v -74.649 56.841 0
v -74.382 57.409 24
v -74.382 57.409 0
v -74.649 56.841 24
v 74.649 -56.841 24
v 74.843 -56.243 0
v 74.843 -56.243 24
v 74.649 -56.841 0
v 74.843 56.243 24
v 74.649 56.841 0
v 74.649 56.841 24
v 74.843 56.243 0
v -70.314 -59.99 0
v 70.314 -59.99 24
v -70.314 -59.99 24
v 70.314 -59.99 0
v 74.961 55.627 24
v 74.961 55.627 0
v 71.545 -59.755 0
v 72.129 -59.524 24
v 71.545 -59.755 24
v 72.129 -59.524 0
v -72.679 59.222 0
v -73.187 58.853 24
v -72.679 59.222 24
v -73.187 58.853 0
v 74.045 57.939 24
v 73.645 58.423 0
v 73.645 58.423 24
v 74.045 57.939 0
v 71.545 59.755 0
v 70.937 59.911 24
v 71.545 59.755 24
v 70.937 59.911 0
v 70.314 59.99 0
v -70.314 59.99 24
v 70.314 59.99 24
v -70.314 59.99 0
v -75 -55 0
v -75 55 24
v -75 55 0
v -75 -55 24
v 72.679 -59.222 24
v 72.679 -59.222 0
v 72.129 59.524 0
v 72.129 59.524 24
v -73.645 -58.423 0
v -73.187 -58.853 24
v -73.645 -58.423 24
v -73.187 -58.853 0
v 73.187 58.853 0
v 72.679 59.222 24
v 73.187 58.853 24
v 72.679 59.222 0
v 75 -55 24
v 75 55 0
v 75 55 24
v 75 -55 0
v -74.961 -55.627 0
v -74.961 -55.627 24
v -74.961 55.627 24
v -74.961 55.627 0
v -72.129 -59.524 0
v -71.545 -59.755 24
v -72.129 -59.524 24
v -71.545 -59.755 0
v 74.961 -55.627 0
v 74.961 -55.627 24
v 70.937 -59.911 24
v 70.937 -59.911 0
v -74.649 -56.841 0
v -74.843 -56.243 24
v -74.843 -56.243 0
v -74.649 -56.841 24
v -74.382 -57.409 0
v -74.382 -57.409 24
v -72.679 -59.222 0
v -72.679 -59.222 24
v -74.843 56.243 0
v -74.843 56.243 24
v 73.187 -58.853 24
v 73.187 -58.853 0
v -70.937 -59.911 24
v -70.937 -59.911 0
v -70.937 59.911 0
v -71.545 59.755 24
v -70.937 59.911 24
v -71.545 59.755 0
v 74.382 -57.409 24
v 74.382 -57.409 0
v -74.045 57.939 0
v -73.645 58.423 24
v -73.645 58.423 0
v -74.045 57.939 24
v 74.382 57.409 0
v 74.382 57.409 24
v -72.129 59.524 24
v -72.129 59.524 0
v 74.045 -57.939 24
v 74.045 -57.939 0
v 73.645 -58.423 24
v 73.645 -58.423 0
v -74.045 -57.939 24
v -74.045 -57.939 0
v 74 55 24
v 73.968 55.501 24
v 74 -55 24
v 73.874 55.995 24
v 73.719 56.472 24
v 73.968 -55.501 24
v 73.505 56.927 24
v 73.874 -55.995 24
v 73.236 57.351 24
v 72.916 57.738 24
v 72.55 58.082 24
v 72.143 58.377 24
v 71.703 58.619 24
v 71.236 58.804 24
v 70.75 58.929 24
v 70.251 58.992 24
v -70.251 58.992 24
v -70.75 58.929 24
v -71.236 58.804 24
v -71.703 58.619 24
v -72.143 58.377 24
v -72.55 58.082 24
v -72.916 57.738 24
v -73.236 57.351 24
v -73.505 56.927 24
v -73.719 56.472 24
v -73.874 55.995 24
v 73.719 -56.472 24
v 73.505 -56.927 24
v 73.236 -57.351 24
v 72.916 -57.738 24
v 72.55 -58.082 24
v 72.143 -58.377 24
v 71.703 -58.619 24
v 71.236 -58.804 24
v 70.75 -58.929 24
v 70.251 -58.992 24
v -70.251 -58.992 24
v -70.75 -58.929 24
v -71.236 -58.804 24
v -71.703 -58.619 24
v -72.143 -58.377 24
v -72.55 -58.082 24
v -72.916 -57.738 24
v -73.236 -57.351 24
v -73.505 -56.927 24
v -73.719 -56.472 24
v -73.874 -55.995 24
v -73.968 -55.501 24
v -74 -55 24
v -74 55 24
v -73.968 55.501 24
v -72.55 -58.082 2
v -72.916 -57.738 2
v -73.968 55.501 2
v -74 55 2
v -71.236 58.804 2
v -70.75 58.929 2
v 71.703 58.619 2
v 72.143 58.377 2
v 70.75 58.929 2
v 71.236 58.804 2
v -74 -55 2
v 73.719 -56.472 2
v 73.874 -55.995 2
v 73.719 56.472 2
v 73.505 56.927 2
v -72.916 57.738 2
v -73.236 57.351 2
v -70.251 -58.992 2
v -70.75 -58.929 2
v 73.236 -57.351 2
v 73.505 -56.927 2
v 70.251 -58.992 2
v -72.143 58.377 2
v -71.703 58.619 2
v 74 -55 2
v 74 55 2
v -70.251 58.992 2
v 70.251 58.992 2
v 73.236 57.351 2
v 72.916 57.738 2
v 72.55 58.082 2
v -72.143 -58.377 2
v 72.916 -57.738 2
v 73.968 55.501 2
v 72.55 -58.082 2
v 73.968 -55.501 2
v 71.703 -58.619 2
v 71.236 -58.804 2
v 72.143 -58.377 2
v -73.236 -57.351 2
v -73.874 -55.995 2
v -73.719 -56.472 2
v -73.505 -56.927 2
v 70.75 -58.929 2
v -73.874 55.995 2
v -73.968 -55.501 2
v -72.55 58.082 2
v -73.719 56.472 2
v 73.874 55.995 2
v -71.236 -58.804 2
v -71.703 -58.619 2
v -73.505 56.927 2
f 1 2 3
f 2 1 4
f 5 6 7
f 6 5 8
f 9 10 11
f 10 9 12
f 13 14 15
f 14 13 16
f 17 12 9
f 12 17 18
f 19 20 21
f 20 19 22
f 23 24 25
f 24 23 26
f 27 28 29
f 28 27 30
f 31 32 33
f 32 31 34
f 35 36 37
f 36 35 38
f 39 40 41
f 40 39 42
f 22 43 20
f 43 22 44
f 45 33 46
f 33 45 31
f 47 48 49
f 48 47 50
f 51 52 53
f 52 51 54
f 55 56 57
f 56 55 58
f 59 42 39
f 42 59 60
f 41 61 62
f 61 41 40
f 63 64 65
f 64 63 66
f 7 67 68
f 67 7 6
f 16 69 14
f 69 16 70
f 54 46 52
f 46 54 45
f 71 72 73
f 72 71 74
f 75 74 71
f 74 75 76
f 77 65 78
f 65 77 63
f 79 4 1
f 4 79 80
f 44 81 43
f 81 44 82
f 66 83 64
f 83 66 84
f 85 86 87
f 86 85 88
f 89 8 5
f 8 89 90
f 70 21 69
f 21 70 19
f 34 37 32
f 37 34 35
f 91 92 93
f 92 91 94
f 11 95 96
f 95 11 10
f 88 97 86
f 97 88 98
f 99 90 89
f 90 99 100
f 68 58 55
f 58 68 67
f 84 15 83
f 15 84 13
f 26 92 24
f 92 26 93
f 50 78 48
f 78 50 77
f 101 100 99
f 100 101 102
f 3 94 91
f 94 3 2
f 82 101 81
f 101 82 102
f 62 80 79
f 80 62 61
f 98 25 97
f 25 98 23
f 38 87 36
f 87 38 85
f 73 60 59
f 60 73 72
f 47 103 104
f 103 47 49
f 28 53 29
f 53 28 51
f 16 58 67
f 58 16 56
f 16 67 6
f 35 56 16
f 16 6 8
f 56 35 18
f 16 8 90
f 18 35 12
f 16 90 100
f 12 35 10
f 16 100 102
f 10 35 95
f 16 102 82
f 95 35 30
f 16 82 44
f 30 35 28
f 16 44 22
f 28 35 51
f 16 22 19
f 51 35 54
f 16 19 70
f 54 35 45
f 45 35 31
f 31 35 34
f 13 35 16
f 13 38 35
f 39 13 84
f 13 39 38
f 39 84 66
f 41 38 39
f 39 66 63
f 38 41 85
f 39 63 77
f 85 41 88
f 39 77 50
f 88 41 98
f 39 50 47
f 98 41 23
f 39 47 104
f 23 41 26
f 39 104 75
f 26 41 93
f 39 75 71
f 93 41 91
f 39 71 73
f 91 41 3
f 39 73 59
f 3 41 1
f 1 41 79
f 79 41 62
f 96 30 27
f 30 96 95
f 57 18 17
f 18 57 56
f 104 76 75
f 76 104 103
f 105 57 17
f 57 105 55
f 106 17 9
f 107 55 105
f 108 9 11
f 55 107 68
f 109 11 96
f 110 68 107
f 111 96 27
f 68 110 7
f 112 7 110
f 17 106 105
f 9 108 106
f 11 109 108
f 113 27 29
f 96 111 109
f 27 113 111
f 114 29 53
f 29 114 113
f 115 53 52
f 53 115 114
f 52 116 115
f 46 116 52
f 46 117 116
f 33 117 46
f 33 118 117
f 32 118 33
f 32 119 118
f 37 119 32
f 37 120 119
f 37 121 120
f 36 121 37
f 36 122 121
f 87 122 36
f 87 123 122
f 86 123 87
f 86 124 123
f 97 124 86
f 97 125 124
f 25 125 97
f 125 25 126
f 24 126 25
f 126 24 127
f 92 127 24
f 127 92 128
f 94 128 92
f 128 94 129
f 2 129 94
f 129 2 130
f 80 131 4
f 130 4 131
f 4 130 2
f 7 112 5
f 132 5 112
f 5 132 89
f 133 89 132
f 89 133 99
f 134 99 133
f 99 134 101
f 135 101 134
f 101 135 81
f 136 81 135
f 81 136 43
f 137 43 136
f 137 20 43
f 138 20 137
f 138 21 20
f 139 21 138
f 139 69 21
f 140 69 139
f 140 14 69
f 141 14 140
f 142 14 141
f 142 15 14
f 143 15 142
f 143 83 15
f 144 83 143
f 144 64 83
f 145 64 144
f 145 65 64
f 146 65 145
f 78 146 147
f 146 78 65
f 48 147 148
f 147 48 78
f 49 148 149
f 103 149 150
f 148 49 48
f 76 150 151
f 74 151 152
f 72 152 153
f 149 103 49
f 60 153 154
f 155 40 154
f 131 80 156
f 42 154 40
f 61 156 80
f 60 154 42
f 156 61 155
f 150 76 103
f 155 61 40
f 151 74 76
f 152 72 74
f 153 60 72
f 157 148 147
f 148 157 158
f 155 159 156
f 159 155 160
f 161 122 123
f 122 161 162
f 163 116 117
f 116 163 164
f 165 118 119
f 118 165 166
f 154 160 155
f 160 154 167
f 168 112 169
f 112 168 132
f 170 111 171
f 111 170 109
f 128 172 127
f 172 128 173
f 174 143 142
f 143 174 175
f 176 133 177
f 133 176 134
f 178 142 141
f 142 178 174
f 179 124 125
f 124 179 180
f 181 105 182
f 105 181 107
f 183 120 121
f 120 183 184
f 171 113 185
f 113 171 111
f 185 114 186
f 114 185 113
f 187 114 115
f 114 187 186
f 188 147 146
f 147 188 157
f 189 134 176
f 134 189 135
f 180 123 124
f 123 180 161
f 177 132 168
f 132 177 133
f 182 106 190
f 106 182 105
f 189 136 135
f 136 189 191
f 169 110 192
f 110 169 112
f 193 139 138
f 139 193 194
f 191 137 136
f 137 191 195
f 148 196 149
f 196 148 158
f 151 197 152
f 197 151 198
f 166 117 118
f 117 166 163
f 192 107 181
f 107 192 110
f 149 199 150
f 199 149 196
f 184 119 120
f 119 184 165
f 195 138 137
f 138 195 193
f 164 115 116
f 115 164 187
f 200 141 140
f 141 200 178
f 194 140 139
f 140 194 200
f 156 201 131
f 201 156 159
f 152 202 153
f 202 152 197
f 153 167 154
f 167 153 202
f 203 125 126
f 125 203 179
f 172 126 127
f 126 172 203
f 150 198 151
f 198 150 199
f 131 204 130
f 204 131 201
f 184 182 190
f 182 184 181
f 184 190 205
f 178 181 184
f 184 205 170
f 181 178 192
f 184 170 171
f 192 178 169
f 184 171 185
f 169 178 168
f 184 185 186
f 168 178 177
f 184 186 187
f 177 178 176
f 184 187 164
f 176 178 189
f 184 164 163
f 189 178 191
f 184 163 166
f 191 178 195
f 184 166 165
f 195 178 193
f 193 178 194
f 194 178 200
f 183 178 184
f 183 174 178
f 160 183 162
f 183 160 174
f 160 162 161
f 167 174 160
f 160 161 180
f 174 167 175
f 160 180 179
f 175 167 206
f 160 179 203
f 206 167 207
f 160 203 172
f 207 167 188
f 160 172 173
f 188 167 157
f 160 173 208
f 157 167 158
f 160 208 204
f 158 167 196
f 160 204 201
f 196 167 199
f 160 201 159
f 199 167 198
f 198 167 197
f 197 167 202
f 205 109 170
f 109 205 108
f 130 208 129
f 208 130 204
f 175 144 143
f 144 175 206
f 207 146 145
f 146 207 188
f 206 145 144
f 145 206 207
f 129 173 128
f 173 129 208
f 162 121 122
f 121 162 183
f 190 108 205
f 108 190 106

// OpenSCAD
$fn = 50;


difference() {
	union() {
		hull() {
			translate(v = [-70.0000000000, 55.0000000000, 0]) {
				cylinder(h = 24, r = 5);
			}
			translate(v = [70.0000000000, 55.0000000000, 0]) {
				cylinder(h = 24, r = 5);
			}
			translate(v = [-70.0000000000, -55.0000000000, 0]) {
				cylinder(h = 24, r = 5);
			}
			translate(v = [70.0000000000, -55.0000000000, 0]) {
				cylinder(h = 24, r = 5);
			}
		}
	}
	union() {
		translate(v = [0, 0, 2]) {
			hull() {
				translate(v = [-70.0000000000, 55.0000000000, 0]) {
					cylinder(h = 22, r = 4);
				}
				translate(v = [70.0000000000, 55.0000000000, 0]) {
					cylinder(h = 22, r = 4);
				}
				translate(v = [-70.0000000000, -55.0000000000, 0]) {
					cylinder(h = 22, r = 4);
				}
				translate(v = [70.0000000000, -55.0000000000, 0]) {
					cylinder(h = 22, r = 4);
				}
			}
		}
	}
}
